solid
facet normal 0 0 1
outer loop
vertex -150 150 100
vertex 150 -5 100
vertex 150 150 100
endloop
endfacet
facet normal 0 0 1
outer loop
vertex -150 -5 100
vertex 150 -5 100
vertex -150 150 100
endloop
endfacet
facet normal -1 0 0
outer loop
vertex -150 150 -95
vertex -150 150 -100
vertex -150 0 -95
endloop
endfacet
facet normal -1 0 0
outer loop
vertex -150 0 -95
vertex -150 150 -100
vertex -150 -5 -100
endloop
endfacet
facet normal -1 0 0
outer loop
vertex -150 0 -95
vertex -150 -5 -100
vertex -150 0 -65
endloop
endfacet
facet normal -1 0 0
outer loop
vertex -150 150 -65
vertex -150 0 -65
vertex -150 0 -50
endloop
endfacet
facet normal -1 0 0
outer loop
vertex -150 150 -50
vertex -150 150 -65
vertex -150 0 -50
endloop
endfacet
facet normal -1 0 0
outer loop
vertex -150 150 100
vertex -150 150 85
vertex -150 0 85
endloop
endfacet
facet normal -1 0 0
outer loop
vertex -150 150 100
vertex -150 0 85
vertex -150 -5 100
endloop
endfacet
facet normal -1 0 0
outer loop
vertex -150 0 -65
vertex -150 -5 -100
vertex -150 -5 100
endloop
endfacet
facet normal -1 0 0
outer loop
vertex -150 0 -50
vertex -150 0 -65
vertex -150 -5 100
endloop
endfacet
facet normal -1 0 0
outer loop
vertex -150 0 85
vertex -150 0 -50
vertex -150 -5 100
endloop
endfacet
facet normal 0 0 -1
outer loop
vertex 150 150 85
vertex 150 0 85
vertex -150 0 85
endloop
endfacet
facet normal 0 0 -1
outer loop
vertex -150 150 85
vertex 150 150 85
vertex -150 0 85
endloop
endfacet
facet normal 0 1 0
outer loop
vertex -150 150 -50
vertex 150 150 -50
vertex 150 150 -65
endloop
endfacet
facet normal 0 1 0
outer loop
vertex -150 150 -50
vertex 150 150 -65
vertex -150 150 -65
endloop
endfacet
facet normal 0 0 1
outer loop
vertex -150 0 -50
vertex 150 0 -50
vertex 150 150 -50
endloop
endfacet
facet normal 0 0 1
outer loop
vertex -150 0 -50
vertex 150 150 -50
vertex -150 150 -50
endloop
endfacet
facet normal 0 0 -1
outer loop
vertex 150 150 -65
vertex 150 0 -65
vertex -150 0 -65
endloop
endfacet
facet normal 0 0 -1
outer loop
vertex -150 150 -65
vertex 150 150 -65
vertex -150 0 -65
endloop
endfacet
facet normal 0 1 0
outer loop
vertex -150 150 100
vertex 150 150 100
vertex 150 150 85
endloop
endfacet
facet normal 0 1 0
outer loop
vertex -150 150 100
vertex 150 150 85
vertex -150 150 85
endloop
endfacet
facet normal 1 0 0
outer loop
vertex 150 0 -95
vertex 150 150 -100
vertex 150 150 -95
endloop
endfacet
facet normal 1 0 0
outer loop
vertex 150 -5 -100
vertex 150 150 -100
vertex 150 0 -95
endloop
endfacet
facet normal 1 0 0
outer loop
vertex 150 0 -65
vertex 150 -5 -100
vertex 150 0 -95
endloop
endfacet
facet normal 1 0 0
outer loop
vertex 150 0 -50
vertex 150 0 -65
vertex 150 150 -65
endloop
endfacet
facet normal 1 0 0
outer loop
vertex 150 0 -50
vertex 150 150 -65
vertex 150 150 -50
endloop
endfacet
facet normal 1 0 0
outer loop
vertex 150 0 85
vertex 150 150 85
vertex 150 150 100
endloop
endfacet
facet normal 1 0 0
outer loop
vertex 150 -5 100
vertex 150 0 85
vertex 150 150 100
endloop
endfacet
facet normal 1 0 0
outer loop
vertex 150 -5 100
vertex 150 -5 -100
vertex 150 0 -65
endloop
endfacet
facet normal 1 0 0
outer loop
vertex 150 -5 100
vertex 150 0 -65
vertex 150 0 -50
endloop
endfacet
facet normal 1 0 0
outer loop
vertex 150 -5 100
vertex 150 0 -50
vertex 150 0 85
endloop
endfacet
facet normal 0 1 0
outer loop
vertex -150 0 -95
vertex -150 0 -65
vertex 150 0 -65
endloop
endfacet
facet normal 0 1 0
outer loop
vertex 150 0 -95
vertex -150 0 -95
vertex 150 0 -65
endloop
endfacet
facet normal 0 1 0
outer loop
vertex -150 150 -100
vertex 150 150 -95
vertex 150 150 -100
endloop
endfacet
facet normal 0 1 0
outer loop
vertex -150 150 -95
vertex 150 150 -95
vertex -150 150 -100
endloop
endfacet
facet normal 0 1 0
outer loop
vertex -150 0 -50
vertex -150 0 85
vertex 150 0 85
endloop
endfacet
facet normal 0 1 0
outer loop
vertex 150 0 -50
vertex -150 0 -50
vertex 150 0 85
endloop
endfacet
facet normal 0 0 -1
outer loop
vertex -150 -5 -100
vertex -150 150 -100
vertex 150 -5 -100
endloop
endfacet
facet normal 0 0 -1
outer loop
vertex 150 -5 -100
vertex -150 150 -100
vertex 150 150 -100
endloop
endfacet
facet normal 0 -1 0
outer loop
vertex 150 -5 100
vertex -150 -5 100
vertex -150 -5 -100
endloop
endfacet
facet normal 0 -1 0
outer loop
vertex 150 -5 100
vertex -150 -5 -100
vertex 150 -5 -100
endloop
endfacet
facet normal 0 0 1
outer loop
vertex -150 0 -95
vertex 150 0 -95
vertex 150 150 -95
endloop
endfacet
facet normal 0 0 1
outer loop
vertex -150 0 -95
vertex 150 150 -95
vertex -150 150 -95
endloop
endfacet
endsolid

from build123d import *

# Parameters (mm, degrees)
F0_W     = 300
F0_H     = 200
F1_DEPTH = 5
F2_W     = 300
F2_H     = 15
F2_H_2   = 5
F3_DEPTH = 150


with BuildPart() as f1:
    # F0 (on Front) → F1 (new body)
    with BuildSketch(Plane.XZ):
        Rectangle(F0_W, F0_H)
    extrude(amount=F1_DEPTH)

    # F2 (on face) → F3 (join)
    with BuildSketch(Plane(origin=(0, 0, 0), x_dir=(-1, 0, 0), z_dir=(0, 1, 0))):
        with Locations((0, 92.5)):
            Rectangle(F2_W, F2_H)
        with Locations((0, -57.5)):
            Rectangle(F2_W, F2_H)
        with Locations((0, -97.5)):
            Rectangle(F2_W, F2_H_2)
    extrude(amount=F3_DEPTH)


solid = f1.part
